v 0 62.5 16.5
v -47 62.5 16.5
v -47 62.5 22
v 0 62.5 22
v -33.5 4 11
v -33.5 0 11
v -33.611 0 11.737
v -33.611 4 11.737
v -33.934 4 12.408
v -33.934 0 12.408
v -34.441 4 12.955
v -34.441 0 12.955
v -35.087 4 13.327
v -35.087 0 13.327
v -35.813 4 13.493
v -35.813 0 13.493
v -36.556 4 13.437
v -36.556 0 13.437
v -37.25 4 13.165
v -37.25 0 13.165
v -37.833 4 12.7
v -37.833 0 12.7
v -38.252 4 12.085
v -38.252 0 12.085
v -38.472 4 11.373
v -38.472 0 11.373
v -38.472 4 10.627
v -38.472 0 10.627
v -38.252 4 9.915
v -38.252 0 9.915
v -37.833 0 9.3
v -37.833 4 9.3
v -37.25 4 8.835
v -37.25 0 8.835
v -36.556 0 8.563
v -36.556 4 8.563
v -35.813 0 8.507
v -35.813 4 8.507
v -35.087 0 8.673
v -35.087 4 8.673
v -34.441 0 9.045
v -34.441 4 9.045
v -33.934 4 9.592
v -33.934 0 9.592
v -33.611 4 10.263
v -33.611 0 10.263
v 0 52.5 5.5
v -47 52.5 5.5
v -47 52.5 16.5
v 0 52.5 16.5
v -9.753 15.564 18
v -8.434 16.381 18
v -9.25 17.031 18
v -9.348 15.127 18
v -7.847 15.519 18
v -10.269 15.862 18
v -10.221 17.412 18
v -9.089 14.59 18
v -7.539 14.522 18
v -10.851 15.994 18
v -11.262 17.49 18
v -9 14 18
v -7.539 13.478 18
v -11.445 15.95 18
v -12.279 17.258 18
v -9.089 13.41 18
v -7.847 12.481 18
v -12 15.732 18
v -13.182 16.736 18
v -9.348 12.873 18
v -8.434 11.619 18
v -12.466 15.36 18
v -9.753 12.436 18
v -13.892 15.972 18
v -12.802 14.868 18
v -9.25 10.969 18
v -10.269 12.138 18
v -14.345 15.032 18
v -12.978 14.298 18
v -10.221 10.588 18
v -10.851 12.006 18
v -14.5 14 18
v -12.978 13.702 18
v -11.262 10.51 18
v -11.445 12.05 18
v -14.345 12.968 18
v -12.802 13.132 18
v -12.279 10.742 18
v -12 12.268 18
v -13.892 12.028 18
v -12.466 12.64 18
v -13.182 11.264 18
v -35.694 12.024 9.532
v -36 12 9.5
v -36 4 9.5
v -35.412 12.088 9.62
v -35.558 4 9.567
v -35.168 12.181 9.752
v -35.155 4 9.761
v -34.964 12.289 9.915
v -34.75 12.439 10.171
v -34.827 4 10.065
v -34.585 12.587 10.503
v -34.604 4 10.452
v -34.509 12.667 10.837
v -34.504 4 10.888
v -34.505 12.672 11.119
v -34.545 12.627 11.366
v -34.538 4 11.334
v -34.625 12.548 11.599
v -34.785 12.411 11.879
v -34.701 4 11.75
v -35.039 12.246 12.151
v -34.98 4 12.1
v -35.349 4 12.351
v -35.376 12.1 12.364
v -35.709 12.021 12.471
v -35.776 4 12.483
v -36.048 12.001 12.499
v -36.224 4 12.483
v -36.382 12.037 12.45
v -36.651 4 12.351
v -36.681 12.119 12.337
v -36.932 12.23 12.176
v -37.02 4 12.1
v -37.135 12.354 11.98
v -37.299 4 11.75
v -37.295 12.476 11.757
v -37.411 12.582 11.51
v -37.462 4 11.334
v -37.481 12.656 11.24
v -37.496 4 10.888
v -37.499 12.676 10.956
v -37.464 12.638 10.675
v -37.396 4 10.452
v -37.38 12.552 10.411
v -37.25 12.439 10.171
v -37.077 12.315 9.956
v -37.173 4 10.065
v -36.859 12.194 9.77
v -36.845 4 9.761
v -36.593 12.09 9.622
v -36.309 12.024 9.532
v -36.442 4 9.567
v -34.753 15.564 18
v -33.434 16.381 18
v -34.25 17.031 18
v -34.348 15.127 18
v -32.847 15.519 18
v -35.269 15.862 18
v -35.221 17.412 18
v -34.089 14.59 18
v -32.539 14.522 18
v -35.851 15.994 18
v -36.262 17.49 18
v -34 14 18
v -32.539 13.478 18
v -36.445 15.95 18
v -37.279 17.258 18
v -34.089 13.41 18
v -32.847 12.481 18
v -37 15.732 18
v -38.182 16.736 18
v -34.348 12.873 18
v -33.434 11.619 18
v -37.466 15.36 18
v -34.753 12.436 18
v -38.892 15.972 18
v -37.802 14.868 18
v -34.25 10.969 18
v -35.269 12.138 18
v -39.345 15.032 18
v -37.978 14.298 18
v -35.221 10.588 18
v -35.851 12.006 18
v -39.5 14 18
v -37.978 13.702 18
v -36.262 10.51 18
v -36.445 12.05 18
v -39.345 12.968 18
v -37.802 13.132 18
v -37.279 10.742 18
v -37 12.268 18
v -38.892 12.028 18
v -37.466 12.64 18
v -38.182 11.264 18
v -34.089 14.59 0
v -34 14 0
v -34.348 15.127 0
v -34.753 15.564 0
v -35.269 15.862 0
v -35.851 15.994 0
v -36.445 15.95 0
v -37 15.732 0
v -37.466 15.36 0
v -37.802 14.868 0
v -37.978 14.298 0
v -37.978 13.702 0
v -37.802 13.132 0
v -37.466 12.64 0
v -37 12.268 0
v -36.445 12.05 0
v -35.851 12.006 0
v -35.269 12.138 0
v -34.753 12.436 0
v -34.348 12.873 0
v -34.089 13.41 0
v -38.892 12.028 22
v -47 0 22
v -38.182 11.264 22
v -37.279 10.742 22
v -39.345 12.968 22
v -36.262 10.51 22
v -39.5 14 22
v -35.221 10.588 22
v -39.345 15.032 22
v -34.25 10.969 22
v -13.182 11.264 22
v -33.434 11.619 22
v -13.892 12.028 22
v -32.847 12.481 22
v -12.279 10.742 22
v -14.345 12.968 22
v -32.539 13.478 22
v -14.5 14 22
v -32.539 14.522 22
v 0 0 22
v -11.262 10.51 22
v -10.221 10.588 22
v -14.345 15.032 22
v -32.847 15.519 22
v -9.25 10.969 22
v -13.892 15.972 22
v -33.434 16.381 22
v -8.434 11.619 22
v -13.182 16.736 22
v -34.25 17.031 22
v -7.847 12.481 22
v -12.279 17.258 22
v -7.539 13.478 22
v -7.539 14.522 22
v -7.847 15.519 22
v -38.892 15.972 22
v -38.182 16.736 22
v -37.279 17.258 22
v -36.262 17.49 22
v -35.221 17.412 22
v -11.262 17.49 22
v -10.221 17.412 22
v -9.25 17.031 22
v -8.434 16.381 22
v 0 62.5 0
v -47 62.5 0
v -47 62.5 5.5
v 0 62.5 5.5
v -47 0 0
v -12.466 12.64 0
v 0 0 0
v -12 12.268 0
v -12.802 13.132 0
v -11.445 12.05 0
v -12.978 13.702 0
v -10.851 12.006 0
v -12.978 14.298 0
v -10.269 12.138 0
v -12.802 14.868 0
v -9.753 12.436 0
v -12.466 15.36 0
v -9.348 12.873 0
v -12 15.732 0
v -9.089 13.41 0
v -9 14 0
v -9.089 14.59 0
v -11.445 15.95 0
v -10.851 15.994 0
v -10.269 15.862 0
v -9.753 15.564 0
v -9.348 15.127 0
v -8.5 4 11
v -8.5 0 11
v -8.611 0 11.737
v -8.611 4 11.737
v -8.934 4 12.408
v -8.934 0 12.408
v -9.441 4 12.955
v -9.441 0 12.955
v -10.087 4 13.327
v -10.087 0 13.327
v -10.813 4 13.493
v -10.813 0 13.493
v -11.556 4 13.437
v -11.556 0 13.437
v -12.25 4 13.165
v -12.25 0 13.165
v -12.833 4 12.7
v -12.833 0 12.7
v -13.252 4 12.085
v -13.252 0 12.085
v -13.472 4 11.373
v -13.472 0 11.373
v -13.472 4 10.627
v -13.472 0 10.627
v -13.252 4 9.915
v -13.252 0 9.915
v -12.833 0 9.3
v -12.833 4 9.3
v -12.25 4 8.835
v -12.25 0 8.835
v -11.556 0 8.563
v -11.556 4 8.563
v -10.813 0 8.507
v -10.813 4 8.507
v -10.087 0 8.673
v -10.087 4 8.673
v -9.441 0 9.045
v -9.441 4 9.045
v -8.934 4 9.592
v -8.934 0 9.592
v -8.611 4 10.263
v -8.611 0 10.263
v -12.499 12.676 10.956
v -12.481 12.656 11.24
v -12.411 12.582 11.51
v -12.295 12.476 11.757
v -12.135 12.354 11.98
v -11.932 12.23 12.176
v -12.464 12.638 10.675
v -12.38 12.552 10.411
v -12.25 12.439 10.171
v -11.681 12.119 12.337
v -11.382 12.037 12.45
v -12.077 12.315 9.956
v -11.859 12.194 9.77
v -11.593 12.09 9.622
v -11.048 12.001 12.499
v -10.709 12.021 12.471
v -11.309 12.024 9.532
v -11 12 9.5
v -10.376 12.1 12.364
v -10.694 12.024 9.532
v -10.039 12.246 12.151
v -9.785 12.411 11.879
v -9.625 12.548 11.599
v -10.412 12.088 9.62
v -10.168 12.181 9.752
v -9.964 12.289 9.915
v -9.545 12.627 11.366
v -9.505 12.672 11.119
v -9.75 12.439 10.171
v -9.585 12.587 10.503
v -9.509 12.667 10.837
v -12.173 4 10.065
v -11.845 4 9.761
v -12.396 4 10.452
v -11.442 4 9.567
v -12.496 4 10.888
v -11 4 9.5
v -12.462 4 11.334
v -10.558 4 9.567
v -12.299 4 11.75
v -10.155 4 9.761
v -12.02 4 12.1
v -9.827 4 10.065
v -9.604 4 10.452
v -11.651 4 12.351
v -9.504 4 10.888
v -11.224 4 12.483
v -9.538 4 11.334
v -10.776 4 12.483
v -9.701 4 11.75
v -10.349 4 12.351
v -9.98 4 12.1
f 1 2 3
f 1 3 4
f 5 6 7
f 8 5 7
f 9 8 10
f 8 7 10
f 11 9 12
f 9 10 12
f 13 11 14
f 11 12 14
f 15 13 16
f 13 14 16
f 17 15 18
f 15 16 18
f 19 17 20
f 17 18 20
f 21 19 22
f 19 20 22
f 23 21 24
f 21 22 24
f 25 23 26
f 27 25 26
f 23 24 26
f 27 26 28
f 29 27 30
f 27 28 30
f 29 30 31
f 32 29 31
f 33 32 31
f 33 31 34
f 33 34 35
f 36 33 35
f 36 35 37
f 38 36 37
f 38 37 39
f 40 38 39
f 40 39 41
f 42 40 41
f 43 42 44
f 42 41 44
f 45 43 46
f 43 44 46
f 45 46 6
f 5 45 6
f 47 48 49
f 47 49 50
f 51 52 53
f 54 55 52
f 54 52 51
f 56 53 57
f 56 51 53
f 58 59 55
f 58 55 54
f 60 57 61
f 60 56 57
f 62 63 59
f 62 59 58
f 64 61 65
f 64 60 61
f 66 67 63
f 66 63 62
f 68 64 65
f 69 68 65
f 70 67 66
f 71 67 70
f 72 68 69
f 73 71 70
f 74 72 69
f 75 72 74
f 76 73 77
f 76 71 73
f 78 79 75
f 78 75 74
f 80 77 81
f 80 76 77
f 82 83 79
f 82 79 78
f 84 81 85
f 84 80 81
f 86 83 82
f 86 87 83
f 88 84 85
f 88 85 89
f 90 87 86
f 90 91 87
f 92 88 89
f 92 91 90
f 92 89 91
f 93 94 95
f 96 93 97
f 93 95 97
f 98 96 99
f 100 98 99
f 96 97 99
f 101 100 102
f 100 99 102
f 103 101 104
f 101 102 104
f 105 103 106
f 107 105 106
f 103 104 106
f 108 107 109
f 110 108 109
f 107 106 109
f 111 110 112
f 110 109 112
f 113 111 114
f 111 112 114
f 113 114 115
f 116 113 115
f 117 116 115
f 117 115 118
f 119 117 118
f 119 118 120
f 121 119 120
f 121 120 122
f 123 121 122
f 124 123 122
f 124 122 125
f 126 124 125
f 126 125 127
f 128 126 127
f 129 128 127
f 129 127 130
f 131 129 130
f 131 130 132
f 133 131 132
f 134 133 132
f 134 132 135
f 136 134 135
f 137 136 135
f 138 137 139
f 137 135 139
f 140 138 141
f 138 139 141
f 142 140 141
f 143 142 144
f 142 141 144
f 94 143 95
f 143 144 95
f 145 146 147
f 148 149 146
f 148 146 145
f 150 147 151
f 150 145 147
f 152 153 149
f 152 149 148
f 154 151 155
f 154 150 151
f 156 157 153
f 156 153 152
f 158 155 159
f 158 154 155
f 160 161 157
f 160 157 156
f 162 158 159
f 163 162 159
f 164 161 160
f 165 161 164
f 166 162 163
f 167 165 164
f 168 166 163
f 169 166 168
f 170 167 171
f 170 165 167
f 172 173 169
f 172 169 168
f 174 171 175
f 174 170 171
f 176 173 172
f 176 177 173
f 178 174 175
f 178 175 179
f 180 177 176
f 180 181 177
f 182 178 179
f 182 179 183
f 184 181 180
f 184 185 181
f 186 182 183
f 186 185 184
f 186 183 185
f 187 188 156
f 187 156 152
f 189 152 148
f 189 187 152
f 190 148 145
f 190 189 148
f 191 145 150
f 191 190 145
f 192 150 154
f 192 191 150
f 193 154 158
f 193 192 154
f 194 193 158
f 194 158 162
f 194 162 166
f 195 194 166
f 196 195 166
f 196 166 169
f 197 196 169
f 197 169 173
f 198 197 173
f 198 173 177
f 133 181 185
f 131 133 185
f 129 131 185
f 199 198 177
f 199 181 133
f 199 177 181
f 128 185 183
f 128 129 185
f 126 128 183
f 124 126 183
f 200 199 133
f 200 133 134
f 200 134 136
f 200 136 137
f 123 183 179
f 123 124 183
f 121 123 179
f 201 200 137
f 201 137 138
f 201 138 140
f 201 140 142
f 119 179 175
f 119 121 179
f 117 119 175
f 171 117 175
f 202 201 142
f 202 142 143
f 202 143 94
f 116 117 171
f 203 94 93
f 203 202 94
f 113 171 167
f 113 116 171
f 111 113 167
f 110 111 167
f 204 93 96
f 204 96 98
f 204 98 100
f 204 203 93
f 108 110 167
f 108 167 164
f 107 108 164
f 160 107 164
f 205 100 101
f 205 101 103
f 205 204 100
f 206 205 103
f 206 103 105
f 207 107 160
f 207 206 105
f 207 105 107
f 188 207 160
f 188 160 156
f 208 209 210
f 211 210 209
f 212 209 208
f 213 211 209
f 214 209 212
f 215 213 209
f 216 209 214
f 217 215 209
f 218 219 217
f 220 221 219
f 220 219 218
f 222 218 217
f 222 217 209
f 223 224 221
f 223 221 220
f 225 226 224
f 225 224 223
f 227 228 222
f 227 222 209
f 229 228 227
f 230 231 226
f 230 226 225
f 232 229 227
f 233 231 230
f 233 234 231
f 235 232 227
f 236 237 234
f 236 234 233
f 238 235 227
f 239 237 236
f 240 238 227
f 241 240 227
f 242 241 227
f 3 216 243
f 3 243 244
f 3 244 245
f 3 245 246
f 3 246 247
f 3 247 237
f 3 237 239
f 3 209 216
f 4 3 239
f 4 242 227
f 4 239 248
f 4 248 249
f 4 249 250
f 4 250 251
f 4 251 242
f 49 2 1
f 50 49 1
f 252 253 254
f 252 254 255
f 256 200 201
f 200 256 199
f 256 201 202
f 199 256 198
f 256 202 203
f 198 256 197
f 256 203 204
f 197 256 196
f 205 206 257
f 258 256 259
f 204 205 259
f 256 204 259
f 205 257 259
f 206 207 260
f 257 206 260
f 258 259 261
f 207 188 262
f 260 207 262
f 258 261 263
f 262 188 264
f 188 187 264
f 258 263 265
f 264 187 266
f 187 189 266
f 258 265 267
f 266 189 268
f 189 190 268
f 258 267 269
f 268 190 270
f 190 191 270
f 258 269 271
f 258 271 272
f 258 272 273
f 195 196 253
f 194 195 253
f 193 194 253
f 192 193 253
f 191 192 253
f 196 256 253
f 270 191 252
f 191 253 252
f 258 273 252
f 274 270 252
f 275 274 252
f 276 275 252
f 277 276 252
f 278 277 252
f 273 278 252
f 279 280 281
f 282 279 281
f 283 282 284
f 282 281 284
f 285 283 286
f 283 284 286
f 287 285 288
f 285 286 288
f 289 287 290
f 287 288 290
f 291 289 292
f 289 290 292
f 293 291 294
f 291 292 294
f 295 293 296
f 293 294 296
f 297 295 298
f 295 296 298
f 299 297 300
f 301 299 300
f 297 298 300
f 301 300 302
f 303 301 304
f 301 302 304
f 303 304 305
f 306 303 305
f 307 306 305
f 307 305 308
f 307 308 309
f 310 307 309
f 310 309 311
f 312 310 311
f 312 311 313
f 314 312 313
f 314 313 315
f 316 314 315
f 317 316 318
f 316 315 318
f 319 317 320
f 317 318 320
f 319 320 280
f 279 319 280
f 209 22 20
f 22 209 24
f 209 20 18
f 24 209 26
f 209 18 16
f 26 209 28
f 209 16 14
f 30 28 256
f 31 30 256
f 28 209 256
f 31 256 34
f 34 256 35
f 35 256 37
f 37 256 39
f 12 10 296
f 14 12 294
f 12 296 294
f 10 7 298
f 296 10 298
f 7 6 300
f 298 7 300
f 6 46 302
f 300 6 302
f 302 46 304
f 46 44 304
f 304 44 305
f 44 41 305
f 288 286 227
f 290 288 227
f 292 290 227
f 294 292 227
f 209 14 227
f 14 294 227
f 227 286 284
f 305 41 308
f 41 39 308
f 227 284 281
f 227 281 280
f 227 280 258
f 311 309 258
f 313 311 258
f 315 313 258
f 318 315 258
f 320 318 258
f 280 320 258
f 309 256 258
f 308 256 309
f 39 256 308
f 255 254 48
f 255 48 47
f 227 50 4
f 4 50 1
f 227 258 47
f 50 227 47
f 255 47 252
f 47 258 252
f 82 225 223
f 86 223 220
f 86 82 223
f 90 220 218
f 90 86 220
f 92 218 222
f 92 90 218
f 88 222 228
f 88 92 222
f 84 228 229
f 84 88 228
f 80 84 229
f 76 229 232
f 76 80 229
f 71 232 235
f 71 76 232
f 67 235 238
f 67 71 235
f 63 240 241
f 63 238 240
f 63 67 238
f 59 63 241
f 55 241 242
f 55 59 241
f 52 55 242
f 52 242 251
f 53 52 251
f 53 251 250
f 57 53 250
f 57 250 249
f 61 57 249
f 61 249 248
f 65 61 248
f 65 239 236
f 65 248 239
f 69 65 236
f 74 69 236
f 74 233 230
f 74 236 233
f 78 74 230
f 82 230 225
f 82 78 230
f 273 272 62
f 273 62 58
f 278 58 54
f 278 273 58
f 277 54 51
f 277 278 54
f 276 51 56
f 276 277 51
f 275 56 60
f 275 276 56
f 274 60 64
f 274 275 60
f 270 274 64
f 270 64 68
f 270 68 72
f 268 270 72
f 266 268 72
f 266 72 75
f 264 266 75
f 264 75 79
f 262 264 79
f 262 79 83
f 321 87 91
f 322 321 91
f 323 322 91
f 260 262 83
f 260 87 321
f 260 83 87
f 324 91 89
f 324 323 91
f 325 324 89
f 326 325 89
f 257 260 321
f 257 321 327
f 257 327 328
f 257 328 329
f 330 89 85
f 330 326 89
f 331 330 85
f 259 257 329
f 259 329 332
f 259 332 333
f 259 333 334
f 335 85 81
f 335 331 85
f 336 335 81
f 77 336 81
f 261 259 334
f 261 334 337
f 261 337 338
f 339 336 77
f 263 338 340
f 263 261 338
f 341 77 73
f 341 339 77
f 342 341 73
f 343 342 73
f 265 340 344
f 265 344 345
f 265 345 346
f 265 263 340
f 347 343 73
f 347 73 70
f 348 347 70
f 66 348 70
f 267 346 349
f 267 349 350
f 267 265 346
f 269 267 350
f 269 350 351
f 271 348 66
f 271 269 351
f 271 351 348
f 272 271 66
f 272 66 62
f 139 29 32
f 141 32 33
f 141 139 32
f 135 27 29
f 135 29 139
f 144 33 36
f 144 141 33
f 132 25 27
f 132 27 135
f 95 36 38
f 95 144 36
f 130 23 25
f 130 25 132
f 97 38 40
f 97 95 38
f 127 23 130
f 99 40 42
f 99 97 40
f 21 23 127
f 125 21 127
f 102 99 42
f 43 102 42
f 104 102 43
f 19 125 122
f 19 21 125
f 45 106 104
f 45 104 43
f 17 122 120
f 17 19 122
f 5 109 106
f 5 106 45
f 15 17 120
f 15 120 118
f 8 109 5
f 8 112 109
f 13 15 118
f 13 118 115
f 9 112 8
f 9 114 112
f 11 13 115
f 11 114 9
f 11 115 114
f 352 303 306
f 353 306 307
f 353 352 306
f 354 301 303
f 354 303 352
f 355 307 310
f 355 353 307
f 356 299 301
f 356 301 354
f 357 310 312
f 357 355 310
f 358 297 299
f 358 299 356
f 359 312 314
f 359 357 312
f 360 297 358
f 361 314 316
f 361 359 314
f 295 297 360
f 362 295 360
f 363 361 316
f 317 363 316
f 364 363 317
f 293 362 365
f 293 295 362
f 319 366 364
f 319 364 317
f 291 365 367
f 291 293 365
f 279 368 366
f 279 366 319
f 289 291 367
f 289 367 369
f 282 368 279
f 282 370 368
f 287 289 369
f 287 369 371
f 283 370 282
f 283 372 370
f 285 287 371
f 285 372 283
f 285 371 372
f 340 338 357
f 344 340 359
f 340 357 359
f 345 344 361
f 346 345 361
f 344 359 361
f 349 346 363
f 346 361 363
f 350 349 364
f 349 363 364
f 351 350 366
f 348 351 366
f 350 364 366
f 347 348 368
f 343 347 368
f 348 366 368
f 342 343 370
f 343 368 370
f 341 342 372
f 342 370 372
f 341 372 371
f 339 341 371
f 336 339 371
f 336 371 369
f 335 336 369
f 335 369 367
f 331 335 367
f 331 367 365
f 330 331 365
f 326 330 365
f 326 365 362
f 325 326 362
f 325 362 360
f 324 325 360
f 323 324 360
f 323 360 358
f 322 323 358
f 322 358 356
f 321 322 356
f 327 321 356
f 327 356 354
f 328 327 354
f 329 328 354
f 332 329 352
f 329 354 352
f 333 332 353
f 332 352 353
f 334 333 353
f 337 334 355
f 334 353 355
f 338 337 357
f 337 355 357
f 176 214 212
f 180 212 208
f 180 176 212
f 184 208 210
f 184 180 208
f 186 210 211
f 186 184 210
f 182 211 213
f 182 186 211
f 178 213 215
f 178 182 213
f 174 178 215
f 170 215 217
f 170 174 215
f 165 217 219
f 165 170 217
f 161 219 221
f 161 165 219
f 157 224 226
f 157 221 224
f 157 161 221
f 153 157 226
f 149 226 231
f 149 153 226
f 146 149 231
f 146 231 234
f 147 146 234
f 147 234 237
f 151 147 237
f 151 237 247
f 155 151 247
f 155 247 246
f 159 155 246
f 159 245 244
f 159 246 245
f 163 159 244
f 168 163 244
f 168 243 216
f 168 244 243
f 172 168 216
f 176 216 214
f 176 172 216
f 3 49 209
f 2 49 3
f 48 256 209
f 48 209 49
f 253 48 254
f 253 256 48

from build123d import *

# Parameters (mm, degrees)
SKETCH1_W               = 47
SKETCH1_H               = 62.5
BOSS_EXTRUDE1_DEPTH     = 22
SKETCH2_W               = 60
SKETCH2_H               = 11
CUT_EXTRUDE1_DEPTH      = 10
CUT_EXTRUDE2_DEPTH      = 82.235767984
CUT_EXTRUDE2_DEPTH_BACK = 82.235767984
SKETCH3_R               = 2
CUT_EXTRUDE3_DEPTH      = 82.235767984
CUT_EXTRUDE3_DEPTH_BACK = 4
SKETCH3_3_R             = 3.5
SKETCH3_3_R_2           = 2
SKETCH4_R               = 1.5
CUT_EXTRUDE6_DEPTH      = 13
SKETCH4_3_R             = 2.5
SKETCH4_3_R_2           = 1.5
CUT_EXTRUDE7_DEPTH      = 4


with BuildPart() as part:
    # Sketch1 → Boss-Extrude1 (new body)
    with BuildSketch(Plane.XY):
        with Locations((-23.5, 31.25)):
            Rectangle(SKETCH1_W, SKETCH1_H)
    extrude(amount=BOSS_EXTRUDE1_DEPTH)

    # Sketch2 → Cut-Extrude1 (cut)
    with BuildSketch(Plane(origin=(0, 62.5, 0), x_dir=(1, 0, 0), z_dir=(0, 1, 0))):
        with Locations((-23.5, -11)):
            Rectangle(SKETCH2_W, SKETCH2_H)
    extrude(amount=-CUT_EXTRUDE1_DEPTH, mode=Mode.SUBTRACT)

    # Sketch3 → Cut-Extrude2 (cut, two sides: drawn at the far end of the back side and taken through both)
    with BuildSketch(Plane.XY.offset(22).offset(-CUT_EXTRUDE2_DEPTH_BACK)):
        with Locations((-36, 14)):
            Circle(SKETCH3_R)
        with Locations((-11, 14)):
            Circle(SKETCH3_R)
    extrude(amount=CUT_EXTRUDE2_DEPTH + CUT_EXTRUDE2_DEPTH_BACK, mode=Mode.SUBTRACT)

    # Sketch3<3> → Cut-Extrude3 (cut, two sides: drawn at the far end of the back side and taken through both)
    # profile 1 of 2: a face of its own
    with BuildSketch(Plane.XY.offset(22).offset(-CUT_EXTRUDE3_DEPTH_BACK)):
        with Locations((-36, 14)):
            Circle(SKETCH3_3_R)
        with Locations((-36, 14)):
            Circle(SKETCH3_3_R_2, mode=Mode.SUBTRACT)
    # profile 2 of 2: a face of its own
    with BuildSketch(Plane.XY.offset(22).offset(-CUT_EXTRUDE3_DEPTH_BACK)):
        with Locations((-11, 14)):
            Circle(SKETCH3_3_R)
        with Locations((-11, 14)):
            Circle(SKETCH3_3_R_2, mode=Mode.SUBTRACT)
    extrude(amount=CUT_EXTRUDE3_DEPTH + CUT_EXTRUDE3_DEPTH_BACK, mode=Mode.SUBTRACT)

    # Sketch4 → Cut-Extrude6 (cut)
    with BuildSketch(Plane.XZ):
        with Locations((-36, 11)):
            Circle(SKETCH4_R)
        with Locations((-11, 11)):
            Circle(SKETCH4_R)
    extrude(amount=-CUT_EXTRUDE6_DEPTH, mode=Mode.SUBTRACT)

    # Sketch4<3> → Cut-Extrude7 (cut)
    # profile 1 of 2: a face of its own
    with BuildSketch(Plane.XZ):
        with Locations((-36, 11)):
            Circle(SKETCH4_3_R)
        with Locations((-36, 11)):
            Circle(SKETCH4_3_R_2, mode=Mode.SUBTRACT)
    # profile 2 of 2: a face of its own
    with BuildSketch(Plane.XZ):
        with Locations((-11, 11)):
            Circle(SKETCH4_3_R)
        with Locations((-11, 11)):
            Circle(SKETCH4_3_R_2, mode=Mode.SUBTRACT)
    extrude(amount=-CUT_EXTRUDE7_DEPTH, mode=Mode.SUBTRACT)


solid = part.part
